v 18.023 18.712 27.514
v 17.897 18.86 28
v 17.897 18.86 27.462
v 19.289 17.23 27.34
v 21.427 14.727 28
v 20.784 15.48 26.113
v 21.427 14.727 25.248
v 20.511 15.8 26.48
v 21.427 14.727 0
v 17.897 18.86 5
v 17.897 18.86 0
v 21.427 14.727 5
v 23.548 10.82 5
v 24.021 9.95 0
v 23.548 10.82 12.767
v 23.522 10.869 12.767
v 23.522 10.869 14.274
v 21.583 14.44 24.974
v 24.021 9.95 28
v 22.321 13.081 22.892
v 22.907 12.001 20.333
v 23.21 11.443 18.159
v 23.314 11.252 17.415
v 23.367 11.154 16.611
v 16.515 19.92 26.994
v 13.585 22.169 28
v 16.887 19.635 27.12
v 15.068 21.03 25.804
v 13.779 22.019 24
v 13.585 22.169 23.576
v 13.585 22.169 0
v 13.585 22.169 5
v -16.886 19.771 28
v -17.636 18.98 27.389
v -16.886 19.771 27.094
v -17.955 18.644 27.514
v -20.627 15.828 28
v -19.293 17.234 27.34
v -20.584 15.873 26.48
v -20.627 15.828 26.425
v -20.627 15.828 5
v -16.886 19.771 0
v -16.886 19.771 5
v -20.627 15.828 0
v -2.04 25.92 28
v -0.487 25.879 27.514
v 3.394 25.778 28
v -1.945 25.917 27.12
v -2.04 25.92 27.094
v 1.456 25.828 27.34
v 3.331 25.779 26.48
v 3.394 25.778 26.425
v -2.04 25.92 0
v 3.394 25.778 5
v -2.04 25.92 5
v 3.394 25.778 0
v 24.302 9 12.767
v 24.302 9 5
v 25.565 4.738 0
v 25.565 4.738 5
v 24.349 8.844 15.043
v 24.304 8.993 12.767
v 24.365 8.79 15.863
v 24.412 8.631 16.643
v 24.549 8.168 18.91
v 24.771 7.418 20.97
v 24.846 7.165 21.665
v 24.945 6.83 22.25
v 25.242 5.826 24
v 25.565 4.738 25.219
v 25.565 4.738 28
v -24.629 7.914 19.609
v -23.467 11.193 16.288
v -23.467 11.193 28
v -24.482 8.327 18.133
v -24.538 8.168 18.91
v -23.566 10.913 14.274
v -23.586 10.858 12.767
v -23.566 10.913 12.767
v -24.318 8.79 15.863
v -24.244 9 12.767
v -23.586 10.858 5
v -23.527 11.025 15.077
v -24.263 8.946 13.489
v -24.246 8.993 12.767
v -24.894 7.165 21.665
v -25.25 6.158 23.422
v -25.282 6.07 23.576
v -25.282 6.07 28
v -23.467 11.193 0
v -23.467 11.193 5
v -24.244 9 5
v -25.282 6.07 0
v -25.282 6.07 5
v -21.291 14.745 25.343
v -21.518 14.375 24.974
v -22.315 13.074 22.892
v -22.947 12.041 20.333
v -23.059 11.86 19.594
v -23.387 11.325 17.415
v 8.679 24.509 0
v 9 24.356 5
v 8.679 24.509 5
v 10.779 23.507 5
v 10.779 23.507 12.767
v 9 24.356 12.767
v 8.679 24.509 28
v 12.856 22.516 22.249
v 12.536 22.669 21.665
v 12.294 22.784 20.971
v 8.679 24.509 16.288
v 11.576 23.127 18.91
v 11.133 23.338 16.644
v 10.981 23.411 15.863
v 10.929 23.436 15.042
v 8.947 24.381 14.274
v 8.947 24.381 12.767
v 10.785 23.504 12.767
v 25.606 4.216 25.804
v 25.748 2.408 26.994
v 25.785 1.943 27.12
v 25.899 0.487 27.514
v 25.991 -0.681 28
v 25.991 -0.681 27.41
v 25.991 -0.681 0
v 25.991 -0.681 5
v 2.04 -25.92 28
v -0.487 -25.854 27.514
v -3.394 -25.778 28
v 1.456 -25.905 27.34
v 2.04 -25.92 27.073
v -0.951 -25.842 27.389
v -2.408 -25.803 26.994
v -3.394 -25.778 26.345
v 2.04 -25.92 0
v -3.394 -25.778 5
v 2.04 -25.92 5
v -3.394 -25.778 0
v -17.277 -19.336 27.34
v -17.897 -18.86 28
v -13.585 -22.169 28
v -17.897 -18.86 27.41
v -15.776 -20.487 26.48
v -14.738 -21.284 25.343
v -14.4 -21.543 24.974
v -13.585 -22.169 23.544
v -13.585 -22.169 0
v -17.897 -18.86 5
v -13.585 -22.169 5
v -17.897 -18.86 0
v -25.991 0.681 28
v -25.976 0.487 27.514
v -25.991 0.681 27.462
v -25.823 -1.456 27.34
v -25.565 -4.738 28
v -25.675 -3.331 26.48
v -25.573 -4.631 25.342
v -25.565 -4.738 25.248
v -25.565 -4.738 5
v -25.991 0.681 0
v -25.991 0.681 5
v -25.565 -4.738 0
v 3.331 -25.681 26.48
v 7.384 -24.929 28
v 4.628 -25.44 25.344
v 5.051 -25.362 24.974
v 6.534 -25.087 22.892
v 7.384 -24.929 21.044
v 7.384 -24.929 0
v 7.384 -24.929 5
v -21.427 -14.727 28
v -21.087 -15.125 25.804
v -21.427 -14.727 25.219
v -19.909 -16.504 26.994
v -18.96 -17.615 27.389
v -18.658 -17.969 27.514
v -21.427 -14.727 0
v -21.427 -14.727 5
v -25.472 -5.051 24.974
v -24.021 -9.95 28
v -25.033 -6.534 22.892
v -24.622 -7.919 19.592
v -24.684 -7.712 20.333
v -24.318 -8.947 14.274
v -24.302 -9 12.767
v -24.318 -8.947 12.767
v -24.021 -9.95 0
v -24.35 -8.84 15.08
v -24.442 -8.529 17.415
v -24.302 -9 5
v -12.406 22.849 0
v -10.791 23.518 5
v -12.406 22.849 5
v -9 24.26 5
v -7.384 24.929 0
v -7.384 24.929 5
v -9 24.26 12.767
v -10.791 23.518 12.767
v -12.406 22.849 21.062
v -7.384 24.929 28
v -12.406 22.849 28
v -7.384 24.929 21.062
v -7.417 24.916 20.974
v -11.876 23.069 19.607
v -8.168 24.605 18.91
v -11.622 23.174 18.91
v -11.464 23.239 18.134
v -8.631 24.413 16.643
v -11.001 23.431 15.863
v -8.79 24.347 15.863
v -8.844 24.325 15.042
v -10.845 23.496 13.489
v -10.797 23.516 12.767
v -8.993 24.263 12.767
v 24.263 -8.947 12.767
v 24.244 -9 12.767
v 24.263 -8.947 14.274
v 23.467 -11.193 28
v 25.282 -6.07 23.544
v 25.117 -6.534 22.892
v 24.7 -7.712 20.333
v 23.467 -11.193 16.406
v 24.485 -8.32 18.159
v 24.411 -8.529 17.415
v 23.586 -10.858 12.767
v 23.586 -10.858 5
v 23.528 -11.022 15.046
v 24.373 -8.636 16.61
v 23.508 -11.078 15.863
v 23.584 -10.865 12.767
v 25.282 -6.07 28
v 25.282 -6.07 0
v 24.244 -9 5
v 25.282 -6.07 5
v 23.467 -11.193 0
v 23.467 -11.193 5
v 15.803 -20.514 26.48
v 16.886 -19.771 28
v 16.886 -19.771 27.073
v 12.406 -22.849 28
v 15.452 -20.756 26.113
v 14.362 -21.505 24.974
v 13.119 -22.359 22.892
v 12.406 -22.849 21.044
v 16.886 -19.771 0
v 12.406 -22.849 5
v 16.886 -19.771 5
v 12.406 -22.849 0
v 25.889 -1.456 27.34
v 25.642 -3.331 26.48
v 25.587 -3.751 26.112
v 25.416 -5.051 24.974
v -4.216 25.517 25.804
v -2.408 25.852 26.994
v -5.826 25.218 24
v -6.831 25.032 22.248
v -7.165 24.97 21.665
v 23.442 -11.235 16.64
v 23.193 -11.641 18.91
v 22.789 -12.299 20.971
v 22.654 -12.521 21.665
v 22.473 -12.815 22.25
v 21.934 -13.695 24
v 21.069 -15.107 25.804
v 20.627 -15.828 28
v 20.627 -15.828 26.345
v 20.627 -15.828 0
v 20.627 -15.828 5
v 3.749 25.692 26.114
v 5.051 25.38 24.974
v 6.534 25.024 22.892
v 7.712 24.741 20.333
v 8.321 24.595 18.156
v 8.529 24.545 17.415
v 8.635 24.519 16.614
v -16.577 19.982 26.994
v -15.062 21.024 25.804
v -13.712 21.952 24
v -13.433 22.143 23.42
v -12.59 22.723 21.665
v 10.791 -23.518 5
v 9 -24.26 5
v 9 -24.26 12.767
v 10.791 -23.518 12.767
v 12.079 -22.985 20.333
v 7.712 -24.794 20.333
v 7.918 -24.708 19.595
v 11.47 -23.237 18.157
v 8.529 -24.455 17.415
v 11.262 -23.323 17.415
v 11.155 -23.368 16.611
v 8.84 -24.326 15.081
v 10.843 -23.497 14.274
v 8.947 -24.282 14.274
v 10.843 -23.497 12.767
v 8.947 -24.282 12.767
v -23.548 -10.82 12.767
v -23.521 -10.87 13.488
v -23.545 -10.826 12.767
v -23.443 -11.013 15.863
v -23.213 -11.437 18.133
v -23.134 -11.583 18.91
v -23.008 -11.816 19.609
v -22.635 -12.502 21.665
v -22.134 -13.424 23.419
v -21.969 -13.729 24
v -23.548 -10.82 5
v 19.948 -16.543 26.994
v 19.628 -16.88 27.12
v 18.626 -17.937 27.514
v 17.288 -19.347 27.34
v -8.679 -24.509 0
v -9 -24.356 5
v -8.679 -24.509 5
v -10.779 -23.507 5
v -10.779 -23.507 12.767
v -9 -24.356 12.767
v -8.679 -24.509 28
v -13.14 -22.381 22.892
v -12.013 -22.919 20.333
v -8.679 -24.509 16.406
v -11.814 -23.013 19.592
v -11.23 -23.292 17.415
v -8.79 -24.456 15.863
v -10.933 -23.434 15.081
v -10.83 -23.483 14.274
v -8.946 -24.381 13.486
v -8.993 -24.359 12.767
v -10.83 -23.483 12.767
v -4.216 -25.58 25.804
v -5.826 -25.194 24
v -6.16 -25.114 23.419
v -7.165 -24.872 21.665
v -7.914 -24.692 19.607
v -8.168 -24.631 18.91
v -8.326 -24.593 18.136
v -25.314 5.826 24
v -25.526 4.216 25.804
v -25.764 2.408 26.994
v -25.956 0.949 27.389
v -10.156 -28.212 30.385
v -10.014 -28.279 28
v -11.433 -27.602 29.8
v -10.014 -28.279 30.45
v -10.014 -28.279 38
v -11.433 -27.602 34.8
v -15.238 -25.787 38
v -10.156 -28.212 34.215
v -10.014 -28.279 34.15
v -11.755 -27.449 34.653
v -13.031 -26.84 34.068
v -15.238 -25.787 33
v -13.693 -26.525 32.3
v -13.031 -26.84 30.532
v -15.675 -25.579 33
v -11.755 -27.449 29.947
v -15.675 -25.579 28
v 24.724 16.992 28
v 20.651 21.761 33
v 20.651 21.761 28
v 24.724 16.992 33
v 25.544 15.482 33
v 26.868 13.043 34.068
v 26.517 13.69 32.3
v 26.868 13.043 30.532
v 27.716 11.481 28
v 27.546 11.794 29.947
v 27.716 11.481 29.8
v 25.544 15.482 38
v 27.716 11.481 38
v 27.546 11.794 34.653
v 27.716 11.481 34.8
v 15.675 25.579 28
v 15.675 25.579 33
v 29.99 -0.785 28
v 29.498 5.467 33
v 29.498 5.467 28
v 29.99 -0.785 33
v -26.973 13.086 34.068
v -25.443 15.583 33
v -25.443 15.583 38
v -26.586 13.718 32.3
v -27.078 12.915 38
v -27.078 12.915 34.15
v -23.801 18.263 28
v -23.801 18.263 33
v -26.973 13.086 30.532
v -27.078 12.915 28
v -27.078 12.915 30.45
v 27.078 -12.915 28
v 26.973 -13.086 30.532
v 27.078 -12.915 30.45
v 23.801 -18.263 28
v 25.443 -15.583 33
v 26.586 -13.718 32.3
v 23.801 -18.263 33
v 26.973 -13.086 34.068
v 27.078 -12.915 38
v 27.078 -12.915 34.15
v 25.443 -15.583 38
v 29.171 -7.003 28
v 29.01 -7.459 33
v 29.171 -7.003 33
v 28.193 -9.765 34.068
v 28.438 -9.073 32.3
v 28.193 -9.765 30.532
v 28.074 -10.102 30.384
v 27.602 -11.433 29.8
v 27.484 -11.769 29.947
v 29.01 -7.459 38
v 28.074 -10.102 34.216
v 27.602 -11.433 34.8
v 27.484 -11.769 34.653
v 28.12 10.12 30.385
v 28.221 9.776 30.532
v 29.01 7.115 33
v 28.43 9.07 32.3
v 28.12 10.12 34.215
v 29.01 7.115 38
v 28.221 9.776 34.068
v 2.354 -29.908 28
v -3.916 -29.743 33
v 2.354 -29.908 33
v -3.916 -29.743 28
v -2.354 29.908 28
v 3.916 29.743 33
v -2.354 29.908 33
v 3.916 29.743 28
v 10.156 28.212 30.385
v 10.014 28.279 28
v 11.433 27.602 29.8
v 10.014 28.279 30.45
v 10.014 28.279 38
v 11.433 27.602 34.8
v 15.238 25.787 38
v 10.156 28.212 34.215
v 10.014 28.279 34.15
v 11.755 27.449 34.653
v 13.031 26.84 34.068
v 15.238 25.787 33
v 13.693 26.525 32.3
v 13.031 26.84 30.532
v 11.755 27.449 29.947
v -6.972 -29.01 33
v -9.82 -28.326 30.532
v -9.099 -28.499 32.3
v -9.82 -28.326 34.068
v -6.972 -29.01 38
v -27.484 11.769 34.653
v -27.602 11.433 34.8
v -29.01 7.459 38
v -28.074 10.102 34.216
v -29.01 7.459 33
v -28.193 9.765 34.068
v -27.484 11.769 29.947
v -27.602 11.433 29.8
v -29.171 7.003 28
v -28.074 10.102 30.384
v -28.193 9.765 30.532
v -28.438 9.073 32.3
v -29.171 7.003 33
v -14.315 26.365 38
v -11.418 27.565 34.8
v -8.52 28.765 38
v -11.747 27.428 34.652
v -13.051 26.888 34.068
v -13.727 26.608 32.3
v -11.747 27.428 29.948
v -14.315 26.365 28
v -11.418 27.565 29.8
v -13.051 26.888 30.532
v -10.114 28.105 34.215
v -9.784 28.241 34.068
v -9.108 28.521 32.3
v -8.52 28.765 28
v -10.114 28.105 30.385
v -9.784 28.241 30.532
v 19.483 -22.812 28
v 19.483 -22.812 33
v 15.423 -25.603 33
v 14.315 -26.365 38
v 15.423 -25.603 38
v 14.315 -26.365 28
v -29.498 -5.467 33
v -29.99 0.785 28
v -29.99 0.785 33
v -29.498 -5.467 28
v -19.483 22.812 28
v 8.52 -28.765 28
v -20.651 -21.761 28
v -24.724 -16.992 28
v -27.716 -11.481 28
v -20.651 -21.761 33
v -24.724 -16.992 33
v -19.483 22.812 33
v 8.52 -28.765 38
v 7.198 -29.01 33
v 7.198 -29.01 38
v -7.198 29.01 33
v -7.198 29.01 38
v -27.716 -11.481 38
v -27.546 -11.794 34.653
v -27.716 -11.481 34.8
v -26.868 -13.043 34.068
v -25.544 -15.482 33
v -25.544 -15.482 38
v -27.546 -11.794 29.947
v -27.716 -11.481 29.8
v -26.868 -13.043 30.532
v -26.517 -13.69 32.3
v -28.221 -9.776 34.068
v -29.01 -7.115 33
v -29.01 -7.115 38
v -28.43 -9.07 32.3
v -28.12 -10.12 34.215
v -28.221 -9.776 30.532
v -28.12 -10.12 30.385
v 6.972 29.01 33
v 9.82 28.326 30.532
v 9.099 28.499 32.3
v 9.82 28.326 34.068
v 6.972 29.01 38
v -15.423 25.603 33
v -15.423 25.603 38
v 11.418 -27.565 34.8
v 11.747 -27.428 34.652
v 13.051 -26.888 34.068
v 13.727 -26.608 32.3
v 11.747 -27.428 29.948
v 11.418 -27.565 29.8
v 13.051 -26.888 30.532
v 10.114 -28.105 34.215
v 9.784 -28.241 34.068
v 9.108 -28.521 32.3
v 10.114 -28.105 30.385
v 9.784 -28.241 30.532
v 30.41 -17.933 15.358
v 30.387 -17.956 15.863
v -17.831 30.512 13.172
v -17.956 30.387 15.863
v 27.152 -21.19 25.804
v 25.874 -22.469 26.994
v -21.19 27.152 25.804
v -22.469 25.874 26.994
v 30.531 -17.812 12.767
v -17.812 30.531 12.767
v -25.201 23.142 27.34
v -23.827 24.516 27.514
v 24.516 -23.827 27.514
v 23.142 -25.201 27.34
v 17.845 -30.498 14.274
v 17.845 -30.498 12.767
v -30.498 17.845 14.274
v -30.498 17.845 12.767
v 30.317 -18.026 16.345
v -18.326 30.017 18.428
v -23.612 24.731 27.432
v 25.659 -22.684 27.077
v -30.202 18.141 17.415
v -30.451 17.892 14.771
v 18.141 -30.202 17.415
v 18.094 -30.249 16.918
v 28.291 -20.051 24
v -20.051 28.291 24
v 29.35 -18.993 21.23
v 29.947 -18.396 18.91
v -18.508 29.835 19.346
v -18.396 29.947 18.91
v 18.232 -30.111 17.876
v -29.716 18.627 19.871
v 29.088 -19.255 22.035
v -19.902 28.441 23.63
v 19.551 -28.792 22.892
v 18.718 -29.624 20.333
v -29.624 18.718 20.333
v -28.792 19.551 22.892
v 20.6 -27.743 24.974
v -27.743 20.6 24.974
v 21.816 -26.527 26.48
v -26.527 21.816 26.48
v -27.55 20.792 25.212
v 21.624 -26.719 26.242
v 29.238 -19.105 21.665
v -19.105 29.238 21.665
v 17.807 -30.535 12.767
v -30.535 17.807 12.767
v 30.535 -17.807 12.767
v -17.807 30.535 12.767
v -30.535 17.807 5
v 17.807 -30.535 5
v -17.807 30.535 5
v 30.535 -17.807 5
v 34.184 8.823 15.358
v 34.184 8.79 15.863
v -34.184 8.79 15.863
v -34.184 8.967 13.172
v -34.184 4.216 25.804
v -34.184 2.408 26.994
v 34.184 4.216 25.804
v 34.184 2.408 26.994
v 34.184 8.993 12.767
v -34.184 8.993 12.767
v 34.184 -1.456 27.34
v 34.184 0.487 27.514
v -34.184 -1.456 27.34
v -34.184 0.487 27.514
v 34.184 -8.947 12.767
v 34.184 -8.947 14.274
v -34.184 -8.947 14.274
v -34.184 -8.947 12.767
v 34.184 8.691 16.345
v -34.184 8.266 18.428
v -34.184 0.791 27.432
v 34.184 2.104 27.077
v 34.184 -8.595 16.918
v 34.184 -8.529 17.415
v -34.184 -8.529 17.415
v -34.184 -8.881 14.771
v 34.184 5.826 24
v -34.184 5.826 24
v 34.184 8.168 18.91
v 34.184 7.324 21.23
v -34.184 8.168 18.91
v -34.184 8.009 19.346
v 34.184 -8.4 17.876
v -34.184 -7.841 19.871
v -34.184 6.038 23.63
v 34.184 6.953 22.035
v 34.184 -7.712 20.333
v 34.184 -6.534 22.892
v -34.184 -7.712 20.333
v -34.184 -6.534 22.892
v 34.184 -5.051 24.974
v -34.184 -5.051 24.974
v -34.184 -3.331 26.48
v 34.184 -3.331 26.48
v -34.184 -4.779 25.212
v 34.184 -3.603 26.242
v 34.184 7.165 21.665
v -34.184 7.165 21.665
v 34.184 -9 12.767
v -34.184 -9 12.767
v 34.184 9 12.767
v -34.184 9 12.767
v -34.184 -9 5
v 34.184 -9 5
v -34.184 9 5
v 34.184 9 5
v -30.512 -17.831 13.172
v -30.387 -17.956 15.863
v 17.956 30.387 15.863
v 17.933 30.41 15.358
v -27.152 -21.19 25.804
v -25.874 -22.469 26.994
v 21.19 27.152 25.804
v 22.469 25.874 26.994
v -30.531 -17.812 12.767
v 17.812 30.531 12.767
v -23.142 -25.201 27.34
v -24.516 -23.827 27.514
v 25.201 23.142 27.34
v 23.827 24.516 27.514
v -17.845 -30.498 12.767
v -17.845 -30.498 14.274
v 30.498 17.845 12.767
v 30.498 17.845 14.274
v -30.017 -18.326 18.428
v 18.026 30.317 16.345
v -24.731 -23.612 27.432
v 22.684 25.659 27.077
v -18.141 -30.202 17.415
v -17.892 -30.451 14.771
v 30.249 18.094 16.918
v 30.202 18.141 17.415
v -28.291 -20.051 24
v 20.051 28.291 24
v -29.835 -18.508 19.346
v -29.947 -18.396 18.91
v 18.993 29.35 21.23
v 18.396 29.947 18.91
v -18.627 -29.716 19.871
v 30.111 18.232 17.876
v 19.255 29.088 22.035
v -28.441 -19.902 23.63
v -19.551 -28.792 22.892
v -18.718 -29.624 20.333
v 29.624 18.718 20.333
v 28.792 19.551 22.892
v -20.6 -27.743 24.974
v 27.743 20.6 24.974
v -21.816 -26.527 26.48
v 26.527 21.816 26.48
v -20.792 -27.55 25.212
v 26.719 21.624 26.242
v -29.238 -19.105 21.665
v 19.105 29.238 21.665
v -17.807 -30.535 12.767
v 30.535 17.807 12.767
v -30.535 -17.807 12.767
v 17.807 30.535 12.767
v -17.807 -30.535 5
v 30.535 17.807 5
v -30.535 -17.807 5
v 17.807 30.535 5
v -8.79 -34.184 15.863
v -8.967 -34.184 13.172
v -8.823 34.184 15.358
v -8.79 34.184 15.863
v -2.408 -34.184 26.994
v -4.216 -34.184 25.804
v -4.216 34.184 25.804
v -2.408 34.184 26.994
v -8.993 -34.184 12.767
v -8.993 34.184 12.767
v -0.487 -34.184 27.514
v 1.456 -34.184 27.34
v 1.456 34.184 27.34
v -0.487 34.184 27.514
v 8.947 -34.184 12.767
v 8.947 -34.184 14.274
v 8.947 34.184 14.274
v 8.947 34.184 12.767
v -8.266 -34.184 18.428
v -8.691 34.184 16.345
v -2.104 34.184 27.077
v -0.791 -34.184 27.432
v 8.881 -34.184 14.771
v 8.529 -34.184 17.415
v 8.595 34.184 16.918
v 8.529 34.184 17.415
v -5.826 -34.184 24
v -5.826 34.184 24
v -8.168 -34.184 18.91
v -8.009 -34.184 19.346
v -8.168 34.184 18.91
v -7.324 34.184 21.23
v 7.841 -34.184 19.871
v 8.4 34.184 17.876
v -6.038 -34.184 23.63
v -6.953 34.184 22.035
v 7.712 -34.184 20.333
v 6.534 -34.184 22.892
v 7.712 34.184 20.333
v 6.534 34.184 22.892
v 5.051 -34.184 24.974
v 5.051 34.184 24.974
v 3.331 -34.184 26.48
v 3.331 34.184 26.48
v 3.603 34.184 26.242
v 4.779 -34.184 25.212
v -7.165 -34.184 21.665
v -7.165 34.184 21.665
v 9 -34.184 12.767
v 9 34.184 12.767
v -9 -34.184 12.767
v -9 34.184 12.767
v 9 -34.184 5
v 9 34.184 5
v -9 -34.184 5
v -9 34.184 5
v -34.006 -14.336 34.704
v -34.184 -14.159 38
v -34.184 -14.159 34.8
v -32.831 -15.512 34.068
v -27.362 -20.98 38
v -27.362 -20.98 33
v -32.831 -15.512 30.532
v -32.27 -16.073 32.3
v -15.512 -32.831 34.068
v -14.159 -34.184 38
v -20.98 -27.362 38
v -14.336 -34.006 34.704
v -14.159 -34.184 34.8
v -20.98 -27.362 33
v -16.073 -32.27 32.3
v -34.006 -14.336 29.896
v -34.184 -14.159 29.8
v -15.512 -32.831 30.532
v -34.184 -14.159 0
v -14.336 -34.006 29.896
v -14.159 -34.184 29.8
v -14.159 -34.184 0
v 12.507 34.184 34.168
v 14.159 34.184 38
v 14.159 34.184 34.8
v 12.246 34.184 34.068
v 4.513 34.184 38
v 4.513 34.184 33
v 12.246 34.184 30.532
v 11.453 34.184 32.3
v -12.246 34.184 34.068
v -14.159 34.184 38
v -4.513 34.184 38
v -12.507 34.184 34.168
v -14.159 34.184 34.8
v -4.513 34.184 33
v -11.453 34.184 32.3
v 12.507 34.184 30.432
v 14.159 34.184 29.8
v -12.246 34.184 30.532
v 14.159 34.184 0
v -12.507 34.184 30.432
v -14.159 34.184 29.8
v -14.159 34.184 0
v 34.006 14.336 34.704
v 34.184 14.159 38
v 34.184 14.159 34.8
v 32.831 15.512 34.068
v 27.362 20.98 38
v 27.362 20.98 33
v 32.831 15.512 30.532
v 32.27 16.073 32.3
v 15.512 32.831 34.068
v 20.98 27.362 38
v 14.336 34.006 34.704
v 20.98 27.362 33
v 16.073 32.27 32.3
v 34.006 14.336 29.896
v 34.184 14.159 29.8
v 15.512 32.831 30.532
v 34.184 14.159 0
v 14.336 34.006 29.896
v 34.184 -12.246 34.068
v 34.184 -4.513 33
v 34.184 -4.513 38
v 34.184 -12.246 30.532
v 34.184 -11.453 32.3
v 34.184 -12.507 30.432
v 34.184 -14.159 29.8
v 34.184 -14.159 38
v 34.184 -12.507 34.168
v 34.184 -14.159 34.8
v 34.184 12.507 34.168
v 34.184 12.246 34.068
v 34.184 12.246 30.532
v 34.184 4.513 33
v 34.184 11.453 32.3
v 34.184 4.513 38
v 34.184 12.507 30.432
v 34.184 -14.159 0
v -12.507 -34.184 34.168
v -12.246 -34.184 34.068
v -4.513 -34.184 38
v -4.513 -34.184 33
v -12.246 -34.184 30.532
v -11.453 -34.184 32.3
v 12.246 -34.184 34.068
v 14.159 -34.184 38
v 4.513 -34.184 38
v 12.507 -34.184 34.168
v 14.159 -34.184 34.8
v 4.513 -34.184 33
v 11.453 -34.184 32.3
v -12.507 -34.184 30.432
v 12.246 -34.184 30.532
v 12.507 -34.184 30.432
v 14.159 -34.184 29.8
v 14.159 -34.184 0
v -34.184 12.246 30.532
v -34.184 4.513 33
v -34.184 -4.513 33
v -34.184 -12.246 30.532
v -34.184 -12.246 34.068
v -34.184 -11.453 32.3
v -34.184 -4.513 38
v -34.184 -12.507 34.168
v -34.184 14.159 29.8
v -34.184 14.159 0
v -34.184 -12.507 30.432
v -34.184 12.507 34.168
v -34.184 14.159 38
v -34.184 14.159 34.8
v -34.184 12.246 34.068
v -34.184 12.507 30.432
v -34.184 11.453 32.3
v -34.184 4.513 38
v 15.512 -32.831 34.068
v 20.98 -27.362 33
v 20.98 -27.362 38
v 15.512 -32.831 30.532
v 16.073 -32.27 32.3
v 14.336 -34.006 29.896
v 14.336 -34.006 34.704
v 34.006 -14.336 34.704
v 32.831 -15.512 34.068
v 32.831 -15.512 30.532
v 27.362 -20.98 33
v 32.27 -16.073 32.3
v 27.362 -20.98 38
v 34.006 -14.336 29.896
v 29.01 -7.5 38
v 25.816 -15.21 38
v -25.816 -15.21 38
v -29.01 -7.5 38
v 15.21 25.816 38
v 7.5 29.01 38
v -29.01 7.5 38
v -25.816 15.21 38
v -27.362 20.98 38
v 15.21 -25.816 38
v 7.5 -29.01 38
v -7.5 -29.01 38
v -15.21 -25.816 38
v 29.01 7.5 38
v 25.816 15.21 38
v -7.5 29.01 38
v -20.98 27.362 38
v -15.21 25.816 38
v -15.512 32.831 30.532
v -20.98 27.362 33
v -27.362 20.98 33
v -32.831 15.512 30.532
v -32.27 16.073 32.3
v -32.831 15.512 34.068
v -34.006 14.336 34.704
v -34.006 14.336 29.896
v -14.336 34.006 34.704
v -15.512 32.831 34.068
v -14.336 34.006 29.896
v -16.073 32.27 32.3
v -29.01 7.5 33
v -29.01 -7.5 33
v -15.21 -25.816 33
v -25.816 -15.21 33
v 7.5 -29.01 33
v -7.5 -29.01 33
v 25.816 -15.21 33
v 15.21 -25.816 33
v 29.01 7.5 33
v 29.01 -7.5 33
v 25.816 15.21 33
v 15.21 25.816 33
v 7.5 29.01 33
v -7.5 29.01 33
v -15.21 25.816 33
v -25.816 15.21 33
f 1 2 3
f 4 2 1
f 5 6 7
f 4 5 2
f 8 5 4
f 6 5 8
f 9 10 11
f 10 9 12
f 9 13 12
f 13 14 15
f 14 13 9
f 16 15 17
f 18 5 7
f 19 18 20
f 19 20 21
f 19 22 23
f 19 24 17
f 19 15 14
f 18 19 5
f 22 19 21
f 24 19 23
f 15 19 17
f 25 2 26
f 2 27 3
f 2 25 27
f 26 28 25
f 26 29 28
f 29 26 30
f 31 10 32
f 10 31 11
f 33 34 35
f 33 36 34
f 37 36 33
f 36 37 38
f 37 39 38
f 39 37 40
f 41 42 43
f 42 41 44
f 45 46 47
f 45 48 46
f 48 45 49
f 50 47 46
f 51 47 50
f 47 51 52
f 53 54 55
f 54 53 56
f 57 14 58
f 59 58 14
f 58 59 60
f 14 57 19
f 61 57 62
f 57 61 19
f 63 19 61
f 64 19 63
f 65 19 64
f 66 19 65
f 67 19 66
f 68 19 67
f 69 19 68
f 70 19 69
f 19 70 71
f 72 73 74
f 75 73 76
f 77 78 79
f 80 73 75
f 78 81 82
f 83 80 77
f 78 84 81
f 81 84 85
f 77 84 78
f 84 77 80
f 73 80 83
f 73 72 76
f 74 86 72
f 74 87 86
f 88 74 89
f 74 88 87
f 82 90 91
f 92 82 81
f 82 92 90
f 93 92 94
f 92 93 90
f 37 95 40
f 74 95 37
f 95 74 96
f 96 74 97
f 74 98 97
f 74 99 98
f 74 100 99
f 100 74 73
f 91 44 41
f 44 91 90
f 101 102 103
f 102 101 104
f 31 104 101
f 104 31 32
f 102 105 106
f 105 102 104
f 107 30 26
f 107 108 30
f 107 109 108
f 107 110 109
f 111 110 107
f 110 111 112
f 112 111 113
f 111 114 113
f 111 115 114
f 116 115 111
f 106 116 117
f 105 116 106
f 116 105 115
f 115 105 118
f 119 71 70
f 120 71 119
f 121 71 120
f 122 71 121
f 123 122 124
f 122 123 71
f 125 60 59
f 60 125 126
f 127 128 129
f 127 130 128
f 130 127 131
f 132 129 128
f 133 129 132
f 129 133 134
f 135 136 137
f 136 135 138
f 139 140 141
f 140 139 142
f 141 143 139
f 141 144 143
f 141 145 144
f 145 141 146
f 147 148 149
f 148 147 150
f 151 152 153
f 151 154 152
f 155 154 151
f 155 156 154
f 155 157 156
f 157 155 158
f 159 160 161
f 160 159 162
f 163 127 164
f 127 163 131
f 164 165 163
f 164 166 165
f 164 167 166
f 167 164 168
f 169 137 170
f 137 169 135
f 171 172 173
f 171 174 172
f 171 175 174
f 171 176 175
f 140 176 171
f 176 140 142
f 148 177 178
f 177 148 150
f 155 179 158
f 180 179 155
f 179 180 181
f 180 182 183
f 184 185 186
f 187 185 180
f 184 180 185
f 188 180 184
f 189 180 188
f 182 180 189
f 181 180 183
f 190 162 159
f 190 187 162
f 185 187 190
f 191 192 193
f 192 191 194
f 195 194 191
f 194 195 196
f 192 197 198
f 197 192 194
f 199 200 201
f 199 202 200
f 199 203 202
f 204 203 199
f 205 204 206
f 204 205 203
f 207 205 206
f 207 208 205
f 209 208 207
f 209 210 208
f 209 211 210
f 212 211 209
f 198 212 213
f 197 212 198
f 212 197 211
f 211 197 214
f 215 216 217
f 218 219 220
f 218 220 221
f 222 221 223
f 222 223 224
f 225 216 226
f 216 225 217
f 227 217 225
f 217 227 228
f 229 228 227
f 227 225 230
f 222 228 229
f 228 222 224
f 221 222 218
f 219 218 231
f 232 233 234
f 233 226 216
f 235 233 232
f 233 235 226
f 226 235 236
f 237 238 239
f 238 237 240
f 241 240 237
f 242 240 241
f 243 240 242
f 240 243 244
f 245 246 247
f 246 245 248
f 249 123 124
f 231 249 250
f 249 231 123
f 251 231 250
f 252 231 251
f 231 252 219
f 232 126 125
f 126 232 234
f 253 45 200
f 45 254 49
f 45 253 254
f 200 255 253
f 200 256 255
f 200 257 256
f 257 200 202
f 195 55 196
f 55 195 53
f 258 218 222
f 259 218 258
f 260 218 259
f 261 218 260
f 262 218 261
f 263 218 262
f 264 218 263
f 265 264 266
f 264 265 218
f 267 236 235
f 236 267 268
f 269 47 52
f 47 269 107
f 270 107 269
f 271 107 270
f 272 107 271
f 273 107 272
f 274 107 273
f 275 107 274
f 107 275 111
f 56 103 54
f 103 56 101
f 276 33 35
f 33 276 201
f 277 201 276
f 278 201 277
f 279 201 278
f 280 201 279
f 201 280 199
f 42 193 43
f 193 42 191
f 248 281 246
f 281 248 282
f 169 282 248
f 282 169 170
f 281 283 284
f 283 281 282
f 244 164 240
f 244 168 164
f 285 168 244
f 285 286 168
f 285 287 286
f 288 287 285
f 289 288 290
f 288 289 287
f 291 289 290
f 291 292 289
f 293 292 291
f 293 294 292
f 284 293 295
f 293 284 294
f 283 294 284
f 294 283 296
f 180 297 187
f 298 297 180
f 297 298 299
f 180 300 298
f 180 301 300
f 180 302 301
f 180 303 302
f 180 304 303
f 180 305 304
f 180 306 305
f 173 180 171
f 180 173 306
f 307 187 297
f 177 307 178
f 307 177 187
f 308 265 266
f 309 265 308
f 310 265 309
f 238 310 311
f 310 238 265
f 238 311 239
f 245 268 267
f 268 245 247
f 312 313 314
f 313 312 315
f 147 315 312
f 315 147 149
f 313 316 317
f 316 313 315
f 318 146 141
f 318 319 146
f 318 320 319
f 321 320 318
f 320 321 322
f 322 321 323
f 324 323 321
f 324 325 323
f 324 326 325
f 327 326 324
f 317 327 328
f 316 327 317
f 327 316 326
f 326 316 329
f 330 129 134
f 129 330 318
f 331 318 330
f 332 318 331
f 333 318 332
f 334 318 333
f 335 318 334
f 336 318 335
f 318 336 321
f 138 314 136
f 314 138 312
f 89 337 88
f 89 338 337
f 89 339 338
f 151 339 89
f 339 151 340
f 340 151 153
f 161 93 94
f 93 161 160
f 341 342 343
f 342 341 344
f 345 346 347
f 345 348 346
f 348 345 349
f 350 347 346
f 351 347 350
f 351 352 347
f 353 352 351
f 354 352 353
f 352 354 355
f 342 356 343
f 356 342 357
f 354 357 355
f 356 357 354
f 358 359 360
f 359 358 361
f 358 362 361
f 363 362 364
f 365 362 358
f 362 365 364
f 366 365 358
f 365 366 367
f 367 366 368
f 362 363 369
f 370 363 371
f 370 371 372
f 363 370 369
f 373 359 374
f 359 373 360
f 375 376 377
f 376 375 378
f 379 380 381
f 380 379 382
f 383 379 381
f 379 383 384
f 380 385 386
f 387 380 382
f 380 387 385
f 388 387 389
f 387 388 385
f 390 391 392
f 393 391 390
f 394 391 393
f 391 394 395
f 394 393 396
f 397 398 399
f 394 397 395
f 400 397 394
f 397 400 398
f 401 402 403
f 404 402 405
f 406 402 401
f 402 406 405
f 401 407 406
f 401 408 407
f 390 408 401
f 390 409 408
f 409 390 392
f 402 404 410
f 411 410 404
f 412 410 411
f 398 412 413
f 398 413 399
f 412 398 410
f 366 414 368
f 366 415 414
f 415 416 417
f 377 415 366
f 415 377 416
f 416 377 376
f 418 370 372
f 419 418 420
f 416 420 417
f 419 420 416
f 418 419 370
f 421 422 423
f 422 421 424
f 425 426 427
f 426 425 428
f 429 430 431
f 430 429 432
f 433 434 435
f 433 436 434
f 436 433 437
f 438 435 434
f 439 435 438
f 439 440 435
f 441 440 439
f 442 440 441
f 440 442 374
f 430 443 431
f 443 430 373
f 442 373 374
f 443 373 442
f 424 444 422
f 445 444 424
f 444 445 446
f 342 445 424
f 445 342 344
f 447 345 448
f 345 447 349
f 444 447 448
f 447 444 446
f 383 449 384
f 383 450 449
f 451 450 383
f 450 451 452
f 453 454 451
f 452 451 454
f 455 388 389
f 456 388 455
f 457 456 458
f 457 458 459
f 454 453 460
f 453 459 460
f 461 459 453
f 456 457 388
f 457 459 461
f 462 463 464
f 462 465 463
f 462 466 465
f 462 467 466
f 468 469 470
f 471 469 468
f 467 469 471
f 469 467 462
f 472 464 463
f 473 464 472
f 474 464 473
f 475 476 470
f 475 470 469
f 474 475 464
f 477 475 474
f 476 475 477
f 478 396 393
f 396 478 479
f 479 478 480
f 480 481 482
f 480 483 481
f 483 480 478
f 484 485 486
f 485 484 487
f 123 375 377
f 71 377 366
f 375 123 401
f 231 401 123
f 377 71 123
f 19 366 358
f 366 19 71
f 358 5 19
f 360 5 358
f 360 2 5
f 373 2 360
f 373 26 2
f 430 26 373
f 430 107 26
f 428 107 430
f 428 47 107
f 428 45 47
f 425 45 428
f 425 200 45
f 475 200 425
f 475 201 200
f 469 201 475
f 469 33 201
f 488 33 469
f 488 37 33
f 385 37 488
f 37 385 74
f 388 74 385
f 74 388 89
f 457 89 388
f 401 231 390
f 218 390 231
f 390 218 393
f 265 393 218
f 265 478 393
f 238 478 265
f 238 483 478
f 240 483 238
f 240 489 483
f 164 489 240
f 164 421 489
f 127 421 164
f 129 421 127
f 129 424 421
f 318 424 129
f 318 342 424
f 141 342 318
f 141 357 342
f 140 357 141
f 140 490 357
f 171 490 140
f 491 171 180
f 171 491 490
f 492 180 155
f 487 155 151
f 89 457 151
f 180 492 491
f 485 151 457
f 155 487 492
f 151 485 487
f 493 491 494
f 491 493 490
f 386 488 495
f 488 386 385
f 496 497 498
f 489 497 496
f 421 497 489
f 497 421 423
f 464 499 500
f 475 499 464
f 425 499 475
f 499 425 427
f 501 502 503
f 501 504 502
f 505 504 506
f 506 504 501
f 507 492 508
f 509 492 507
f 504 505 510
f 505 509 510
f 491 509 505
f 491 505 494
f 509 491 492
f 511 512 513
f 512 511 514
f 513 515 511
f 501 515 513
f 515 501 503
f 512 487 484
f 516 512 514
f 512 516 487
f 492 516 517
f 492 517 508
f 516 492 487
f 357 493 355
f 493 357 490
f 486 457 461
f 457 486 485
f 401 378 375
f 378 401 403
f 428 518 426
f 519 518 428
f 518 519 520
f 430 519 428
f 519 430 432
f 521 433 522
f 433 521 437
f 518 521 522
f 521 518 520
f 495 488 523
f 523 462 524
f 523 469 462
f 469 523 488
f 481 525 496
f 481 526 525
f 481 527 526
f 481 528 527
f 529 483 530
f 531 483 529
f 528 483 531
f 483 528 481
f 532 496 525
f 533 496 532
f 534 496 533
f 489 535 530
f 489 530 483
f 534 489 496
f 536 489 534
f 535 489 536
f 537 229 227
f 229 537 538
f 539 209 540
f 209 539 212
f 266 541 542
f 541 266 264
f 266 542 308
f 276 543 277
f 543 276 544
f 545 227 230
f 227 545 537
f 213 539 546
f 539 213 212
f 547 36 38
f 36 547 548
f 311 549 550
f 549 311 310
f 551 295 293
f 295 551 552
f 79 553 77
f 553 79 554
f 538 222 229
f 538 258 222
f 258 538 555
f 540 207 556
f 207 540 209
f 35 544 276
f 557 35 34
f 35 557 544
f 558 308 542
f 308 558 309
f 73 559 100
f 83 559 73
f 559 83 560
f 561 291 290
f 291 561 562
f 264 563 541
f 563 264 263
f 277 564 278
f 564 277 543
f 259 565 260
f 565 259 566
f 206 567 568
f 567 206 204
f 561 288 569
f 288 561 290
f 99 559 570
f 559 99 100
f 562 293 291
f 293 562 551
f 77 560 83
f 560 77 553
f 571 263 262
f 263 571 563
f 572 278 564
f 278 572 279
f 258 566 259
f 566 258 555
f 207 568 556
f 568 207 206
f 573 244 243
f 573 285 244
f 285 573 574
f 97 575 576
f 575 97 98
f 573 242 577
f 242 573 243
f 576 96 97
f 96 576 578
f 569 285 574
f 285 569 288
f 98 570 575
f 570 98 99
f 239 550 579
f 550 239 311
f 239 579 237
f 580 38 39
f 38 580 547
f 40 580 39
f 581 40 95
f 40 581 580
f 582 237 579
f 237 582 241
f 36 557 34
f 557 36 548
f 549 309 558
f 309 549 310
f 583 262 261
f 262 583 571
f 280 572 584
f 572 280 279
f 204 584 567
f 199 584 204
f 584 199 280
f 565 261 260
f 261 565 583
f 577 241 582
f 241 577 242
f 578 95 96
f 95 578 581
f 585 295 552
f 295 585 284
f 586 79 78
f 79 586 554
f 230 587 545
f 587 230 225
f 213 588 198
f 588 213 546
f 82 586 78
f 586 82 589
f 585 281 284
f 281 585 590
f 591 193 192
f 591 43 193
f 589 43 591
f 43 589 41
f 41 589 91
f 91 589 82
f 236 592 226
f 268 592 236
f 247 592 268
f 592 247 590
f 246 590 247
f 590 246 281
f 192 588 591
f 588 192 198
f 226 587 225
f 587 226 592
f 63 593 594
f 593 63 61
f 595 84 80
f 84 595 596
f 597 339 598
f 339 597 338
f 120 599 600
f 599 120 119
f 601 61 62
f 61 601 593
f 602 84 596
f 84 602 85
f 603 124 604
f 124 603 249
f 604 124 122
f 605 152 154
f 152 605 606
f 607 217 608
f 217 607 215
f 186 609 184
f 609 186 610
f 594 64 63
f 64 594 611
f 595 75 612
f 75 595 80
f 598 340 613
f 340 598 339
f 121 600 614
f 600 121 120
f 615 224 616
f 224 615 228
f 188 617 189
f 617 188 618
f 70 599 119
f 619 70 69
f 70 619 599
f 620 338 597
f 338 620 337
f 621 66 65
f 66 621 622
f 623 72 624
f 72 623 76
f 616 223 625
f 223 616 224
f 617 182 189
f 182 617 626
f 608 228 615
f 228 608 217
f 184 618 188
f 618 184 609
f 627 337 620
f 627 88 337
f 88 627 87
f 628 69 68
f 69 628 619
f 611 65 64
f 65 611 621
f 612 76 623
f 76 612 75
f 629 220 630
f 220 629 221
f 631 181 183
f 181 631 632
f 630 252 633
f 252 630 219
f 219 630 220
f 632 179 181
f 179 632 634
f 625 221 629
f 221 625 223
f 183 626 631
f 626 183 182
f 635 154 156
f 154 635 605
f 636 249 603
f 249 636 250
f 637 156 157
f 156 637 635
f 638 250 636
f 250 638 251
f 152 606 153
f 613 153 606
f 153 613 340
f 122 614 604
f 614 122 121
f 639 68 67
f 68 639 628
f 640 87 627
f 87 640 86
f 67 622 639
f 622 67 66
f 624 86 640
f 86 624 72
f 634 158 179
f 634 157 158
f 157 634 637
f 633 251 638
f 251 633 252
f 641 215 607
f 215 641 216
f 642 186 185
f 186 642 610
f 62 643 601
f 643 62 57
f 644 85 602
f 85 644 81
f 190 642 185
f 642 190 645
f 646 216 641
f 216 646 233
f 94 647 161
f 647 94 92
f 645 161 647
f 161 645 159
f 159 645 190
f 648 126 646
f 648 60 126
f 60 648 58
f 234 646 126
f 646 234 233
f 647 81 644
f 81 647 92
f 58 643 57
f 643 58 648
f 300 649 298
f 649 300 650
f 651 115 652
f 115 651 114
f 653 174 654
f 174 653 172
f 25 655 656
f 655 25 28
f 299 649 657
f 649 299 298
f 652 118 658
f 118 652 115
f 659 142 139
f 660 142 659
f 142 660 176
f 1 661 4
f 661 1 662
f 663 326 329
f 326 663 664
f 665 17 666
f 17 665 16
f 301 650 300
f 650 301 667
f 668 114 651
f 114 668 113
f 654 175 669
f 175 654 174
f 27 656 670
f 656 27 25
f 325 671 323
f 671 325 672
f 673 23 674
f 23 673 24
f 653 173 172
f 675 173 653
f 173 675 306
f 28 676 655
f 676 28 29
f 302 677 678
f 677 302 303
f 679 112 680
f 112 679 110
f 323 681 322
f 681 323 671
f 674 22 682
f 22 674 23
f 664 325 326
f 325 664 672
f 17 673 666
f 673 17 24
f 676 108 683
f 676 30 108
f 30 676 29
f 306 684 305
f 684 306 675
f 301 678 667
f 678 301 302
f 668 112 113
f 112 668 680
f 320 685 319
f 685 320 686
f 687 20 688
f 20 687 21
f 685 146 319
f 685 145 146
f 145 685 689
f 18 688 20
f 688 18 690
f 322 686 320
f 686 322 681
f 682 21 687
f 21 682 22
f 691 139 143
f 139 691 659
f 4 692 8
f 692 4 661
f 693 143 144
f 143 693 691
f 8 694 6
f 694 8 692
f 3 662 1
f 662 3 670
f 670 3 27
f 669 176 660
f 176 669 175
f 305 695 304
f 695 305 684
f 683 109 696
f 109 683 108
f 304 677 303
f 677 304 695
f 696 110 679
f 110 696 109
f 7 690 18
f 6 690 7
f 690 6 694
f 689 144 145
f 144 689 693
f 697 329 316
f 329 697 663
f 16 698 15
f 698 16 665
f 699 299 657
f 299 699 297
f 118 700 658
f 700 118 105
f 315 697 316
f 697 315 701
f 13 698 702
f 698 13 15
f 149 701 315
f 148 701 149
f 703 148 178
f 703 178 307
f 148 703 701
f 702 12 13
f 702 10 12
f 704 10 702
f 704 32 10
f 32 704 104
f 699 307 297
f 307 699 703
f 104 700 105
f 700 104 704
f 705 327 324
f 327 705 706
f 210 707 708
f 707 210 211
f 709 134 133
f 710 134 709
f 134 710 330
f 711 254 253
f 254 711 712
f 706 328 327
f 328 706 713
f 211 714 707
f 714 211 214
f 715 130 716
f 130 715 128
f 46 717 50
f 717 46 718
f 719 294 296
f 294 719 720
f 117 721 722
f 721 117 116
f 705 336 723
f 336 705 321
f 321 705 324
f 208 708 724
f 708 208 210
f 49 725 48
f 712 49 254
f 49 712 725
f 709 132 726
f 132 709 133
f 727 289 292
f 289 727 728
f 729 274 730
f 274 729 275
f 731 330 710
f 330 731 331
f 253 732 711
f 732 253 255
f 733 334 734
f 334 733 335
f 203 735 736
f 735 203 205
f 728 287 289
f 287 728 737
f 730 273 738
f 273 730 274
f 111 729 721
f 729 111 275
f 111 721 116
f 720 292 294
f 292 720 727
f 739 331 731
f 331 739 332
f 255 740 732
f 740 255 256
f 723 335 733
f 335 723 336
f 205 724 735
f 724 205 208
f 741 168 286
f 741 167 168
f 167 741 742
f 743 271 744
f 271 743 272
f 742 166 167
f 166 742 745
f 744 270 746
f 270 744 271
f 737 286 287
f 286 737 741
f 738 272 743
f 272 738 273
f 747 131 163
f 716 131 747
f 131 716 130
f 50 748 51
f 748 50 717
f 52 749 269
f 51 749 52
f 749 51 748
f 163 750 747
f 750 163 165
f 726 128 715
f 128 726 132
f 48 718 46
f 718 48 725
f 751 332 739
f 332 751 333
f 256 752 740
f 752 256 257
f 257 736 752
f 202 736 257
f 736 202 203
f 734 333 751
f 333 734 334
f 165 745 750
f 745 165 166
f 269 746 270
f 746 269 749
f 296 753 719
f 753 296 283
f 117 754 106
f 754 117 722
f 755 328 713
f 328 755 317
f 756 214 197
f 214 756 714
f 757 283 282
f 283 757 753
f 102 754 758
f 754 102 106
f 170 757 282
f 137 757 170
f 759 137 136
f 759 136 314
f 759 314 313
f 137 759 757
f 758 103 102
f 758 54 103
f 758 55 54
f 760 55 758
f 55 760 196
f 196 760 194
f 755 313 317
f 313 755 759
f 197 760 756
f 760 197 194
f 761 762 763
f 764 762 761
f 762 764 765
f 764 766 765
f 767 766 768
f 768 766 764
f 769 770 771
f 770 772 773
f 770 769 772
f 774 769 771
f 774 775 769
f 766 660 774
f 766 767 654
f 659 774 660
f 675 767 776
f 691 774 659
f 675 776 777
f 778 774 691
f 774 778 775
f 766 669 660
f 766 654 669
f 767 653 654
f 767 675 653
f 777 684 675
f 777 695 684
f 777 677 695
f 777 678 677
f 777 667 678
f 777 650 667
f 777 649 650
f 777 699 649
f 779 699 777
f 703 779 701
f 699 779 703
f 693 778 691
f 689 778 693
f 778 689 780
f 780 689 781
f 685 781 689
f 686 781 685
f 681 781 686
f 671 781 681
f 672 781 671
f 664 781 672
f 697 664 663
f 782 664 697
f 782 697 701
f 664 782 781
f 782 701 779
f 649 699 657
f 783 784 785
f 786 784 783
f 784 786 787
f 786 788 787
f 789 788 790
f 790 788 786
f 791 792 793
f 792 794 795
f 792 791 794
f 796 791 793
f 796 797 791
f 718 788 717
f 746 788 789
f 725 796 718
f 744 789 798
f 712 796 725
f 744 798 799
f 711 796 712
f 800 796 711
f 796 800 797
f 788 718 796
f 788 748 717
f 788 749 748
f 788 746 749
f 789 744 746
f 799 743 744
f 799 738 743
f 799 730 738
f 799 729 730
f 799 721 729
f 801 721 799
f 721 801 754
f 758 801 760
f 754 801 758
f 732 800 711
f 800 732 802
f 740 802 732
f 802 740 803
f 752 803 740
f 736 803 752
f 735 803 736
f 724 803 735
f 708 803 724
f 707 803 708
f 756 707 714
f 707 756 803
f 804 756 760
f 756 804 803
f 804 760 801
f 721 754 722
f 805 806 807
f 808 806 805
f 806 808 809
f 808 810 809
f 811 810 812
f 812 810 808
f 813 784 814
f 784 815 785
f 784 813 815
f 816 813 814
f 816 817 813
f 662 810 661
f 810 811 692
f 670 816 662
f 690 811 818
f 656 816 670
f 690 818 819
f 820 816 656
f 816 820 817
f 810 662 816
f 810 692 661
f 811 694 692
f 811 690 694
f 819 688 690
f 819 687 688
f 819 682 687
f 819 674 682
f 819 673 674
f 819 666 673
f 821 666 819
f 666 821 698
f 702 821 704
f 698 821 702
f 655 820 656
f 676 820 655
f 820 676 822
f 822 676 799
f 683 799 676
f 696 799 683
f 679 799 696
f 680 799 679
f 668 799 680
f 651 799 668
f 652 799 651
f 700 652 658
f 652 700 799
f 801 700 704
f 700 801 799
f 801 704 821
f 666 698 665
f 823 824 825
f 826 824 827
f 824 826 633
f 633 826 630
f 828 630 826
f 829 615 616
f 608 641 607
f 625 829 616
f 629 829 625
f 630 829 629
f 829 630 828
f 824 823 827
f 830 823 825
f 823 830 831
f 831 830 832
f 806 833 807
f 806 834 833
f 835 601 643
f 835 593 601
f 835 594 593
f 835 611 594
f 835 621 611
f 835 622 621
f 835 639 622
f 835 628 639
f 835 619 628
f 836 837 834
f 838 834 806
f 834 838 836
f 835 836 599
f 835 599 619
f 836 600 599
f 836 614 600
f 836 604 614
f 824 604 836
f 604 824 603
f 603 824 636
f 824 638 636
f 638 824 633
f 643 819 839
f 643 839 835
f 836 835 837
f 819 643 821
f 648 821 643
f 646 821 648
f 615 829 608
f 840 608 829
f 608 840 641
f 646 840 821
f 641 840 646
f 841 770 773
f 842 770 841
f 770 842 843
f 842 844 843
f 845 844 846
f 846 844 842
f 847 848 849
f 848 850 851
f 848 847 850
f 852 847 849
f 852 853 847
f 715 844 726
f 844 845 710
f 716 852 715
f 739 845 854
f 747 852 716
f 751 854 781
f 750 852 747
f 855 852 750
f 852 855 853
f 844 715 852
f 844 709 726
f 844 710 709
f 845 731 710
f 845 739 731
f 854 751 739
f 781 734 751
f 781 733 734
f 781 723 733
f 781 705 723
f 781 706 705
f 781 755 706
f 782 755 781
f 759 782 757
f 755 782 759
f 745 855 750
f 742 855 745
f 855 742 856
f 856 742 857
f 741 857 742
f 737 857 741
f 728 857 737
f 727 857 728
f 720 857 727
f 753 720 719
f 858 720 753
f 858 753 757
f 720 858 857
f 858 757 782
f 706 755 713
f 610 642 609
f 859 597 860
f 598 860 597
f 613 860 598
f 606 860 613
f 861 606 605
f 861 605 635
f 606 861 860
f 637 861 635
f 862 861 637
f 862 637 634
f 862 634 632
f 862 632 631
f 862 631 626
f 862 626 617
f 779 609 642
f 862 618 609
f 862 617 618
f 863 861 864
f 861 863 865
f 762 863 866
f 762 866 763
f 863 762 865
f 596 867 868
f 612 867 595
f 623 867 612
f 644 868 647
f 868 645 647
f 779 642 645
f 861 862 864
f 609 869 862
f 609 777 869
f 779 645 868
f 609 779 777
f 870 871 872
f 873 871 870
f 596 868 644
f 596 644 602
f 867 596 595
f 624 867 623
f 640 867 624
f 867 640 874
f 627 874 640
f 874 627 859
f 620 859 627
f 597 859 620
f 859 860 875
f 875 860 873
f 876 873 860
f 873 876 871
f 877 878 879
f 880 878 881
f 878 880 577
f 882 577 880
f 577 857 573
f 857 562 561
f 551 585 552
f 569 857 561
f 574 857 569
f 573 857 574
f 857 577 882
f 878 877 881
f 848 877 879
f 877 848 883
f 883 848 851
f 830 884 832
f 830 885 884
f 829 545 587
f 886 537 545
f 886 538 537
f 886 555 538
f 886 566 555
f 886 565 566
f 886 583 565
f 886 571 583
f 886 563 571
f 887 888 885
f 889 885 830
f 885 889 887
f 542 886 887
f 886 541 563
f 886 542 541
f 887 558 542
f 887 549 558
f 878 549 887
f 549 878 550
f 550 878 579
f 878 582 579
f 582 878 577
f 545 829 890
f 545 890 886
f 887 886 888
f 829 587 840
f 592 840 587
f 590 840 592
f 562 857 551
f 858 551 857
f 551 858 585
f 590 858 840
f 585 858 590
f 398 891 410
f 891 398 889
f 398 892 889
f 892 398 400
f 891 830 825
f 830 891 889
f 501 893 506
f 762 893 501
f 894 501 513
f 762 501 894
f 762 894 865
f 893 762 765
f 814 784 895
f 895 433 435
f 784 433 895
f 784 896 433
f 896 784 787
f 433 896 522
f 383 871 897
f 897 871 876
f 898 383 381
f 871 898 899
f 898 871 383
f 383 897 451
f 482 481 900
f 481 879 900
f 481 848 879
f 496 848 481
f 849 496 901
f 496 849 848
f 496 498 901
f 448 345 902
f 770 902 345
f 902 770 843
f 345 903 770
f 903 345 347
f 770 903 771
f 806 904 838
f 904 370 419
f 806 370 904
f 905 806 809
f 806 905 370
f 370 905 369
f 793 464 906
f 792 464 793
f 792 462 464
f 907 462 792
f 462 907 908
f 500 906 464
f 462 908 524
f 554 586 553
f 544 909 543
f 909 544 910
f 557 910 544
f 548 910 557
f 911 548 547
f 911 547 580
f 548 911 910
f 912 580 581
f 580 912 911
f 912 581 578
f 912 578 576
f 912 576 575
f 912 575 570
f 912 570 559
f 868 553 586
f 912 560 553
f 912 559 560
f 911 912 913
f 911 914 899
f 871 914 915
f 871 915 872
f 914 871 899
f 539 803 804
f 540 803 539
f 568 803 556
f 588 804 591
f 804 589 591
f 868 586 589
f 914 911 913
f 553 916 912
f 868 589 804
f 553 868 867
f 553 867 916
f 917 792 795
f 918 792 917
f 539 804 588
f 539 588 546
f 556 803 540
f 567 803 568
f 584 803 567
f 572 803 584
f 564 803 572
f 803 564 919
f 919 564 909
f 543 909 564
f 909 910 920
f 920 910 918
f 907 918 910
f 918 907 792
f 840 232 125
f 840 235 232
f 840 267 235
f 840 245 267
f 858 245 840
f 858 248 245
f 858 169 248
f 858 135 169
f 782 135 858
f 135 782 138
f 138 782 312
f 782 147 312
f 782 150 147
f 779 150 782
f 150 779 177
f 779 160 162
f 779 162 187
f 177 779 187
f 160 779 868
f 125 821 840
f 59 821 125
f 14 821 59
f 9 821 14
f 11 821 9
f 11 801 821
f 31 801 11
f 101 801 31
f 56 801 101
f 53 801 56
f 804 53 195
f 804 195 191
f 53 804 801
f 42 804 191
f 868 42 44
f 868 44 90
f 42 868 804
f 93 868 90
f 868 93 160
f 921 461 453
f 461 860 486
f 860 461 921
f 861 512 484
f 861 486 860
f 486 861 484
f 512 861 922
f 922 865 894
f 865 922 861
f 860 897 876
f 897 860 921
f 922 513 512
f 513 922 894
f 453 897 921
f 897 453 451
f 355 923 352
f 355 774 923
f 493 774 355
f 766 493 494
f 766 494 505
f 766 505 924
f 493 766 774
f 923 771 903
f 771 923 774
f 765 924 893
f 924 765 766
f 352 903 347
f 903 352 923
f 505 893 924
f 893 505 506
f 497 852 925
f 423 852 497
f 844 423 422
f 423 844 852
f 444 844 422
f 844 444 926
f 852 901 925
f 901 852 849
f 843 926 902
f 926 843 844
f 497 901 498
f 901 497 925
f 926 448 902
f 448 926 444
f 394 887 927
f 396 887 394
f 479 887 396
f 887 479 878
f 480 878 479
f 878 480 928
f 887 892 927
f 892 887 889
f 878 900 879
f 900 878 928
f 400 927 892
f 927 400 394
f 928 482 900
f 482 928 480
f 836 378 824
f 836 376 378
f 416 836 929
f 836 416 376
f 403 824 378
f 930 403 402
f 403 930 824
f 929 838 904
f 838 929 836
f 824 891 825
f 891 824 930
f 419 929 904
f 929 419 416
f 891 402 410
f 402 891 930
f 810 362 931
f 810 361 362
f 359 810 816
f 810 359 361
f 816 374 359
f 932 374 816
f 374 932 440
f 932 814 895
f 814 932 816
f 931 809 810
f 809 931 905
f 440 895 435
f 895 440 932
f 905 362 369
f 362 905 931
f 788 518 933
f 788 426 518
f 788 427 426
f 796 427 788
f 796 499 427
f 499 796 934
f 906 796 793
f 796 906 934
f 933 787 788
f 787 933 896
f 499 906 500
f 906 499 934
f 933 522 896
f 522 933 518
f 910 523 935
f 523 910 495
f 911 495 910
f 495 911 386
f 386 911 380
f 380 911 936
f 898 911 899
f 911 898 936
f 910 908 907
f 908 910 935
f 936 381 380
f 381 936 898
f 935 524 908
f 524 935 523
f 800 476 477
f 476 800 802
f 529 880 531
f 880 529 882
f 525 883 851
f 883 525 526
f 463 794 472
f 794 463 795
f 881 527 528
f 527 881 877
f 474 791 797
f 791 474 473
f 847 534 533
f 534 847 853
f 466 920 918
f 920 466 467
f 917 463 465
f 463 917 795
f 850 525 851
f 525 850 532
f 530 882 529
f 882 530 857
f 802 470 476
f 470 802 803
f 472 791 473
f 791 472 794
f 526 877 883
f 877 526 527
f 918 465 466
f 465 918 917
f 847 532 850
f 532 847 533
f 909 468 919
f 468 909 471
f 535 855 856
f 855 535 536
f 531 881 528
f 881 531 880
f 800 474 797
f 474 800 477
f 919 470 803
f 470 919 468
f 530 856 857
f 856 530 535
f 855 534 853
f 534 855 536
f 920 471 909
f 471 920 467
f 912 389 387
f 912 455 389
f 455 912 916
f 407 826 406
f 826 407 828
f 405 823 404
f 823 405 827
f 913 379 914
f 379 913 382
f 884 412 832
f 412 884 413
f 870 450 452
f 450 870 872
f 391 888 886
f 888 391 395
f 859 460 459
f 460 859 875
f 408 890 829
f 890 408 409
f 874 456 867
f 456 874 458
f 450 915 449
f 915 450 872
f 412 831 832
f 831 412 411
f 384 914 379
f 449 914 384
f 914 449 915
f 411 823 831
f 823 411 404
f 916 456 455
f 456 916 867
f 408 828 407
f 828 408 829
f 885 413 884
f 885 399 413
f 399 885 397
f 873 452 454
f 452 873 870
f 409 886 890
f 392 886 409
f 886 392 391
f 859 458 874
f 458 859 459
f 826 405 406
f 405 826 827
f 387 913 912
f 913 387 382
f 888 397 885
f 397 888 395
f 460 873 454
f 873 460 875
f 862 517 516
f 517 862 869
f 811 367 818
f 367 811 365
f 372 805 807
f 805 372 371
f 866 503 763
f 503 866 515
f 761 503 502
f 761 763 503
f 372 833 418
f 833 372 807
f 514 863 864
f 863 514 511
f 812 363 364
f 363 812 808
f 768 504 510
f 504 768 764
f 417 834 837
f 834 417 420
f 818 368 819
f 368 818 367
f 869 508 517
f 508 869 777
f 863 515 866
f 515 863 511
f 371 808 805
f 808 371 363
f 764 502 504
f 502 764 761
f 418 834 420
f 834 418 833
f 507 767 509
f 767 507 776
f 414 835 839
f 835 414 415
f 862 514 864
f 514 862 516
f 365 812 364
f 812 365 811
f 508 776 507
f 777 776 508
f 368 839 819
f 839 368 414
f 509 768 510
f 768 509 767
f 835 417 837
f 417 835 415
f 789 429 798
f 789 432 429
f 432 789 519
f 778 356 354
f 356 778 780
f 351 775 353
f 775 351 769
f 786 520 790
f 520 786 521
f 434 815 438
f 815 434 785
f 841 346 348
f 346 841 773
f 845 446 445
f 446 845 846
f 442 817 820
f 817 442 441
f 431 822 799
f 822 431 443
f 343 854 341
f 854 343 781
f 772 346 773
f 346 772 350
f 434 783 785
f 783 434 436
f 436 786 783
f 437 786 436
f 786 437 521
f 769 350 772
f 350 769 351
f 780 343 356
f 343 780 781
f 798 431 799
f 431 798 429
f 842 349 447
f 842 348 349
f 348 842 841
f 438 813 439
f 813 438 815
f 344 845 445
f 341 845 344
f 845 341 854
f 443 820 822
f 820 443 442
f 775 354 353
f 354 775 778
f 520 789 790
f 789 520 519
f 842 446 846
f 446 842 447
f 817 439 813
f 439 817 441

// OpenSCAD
// is the width of the spool hub
reelWidth = 38; // [35:100]

module core() {

	innerCylWidth = max(10, (reelWidth/4));

	//echo(innerCylWidth);
	union() {
		// x was 60
		translate([0,0,-0.05])cylinder(reelWidth+0.1,26,26);
	    // translate z was 60
		translate([0,0,min(reelWidth,reelWidth-(innerCylWidth+0))])
			cylinder(innerCylWidth+.05,30,30);
	}
}

module arch() {
     //   reelWidth was 25
	translate([0,0,reelWidth/3])union() {
		difference() {
			// z scale was 3.3
			scale([1,1,reelWidth/23])
				rotate([90,0,22.5])
					translate([0,0,-50])
						cylinder(100,9,9);
			translate([-50,-50,-50])
				cube([100,100,50]);
		}
		// cube z was 21
	    // translate z was -20
		rotate([0,0,22.5]) 
			translate([-9,-50,-((reelWidth/3)-5)])
				cube([18,100,(reelWidth/3.0)-4.9]);
	}
}
module eTrangle(height,length) {
	rotate([0,0,-30])
	difference() {
		cube([length,length,height]);
		translate([0,0,-0.5])rotate([0,0,60])cube([length*1.2,length*1.2,height+1]);
		translate([length,0,-0.5])rotate([0,0,30])cube([length*1.2,length*1.2,height+1]);
	}
}
module reel() {
	difference() {
		cylinder(reelWidth,37,37,$fn=8);
		core();
		arch();
		rotate([0,0,45]) arch();
		rotate([0,0,90]) arch();
		rotate([0,0,135]) arch();
	}
}
module drumCentre() {
	filamentHoleRotation =  reelWidth < 60 ? 22.5 : 0;
	difference() {
		
		rotate([0,0,22.5])reel();

		for (i=[0:7]) {
			//rotate([0,0,i*45])translate([-42,0,-0.1])eTrangle(5.2,15);
			// translate z was 71
			rotate([0,0,i*45])translate([-42,0,reelWidth-5])eTrangle(5.1,15);
		}
		// filament holes
		for (i=[0:3]) {
             // translate y was 65
			rotate([90,0,(i*45)+filamentHoleRotation]) translate([0,reelWidth*.85,-50]) 
				cylinder(100,2.5,2.5);
		}

	}
}
module arm() {
	translate([34.25,-7.5,0]) difference() {
		union() {
			translate([0,0,0])cube([65,15,5]);
			translate([7.45,7.5,0])rotate([0,0,180])eTrangle(5,14.5);
		}
		translate([5,-0.1,-0.1])cube([45,5.1,5.2]);
		translate([5,10.1,-0.1])cube([45,5.1,5.2]);
		translate([62.5,4,-0.1])rotate([0,0,210])eTrangle(5.2,10);
		translate([62.5,11,-0.1])rotate([0,0,150])eTrangle(5.2,10);
	}
}
module loadArm() {
	import_stl("spool2arm.stl",convexity=10);
}
module edge(withHoles) {
	union() {
		difference() {
			cylinder(5,99.6,99.6,$fn=50);
			translate([0,0,-0.1])cylinder(5.2,84.6,84.6,$fn=50);
			translate([-105,-102.45,-0.1])cube([210,110,10]);
			rotate([0,0,45])translate([-105,-7.55,-0.1])cube([210,110,10]);
			if (withHoles) {
				translate([90.5,18,-0.1]) cylinder(5.2,2.5,2.5);
				translate([87.5,30,-0.1]) cylinder(5.2,2.5,2.5);
				translate([82.5,42,-0.1]) cylinder(5.2,2.5,2.5);
				translate([76,52,-0.1]) cylinder(5.2,2.5,2.5);
			}
		}
		rotate([0,0,45])translate([86.85,-3.6,0])rotate([0,0,-30]) eTrangle(5,9.8);
		translate([96.65,3.6,0])rotate([0,0,150]) eTrangle(5,9.8);
	}
}
module spool() {
	translate([5,0,0])import_stl("spool2core.stl",convexity=10);
	for (i=[0:7]) {
		rotate([0,0,i*45])loadArm();
		rotate([0,0,i*45])translate([0,0,71])loadArm();
		rotate([0,0,i*45])edge((i%2)==0);
		rotate([0,0,i*45])translate([0,0,71])edge((i%2)==1);
	}
}
module explodedSpool() {
	translate([5,0,0])import_stl("spool2core.stl",convexity=10);
	for (i=[0:7]) {
		rotate([0,0,i*45])translate([10,0,0]) loadArm();
		rotate([0,0,i*45])translate([10,0,71])loadArm();
		rotate([0,0,i*45])translate([20,10,0]) edge((i%2)==0);
		rotate([0,0,i*45])translate([20,10,71])edge((i%2)==1);
	}
}

//%color([0.5,0.5,0.5,0.1]) translate([-50,-50,-1.01]) cube([100,100,1]);
module arms(allSix) {
	translate([-75,-6,0]) arm();
	translate([-57,6,0]) arm();
	translate([-57,-18,0]) arm();
	translate([-75,18,0]) arm();
	if (allSix)  {
		translate([-75,-30,0]) arm();
		translate([-57,30,0]) arm();
	}
}
module edges() {
	translate([2,-10,0])rotate([0,0,67.5])translate([-85,-33.5,0]) edge(true);
	translate([2,10,0])rotate([0,0,67.5])translate([-85,-33.5,0]) edge(false);
	translate([2,30,0])rotate([0,0,67.5])translate([-85,-33.5,0]) edge(true);
	translate([2,-30,0])rotate([0,0,67.5])translate([-85,-33.5,0]) edge(false);
}

//arms(false);
//edges();
//translate([0,-200,0])arms(true);
//translate([125,-200,0])arm();
//translate([250,-200,0])edges();
//translate([250,0,0])spool();
//explodedSpool();
//translate([125,-200,0])translate([5,0,0])import_stl("spool2core.stl",convexity=10);
drumCentre();
